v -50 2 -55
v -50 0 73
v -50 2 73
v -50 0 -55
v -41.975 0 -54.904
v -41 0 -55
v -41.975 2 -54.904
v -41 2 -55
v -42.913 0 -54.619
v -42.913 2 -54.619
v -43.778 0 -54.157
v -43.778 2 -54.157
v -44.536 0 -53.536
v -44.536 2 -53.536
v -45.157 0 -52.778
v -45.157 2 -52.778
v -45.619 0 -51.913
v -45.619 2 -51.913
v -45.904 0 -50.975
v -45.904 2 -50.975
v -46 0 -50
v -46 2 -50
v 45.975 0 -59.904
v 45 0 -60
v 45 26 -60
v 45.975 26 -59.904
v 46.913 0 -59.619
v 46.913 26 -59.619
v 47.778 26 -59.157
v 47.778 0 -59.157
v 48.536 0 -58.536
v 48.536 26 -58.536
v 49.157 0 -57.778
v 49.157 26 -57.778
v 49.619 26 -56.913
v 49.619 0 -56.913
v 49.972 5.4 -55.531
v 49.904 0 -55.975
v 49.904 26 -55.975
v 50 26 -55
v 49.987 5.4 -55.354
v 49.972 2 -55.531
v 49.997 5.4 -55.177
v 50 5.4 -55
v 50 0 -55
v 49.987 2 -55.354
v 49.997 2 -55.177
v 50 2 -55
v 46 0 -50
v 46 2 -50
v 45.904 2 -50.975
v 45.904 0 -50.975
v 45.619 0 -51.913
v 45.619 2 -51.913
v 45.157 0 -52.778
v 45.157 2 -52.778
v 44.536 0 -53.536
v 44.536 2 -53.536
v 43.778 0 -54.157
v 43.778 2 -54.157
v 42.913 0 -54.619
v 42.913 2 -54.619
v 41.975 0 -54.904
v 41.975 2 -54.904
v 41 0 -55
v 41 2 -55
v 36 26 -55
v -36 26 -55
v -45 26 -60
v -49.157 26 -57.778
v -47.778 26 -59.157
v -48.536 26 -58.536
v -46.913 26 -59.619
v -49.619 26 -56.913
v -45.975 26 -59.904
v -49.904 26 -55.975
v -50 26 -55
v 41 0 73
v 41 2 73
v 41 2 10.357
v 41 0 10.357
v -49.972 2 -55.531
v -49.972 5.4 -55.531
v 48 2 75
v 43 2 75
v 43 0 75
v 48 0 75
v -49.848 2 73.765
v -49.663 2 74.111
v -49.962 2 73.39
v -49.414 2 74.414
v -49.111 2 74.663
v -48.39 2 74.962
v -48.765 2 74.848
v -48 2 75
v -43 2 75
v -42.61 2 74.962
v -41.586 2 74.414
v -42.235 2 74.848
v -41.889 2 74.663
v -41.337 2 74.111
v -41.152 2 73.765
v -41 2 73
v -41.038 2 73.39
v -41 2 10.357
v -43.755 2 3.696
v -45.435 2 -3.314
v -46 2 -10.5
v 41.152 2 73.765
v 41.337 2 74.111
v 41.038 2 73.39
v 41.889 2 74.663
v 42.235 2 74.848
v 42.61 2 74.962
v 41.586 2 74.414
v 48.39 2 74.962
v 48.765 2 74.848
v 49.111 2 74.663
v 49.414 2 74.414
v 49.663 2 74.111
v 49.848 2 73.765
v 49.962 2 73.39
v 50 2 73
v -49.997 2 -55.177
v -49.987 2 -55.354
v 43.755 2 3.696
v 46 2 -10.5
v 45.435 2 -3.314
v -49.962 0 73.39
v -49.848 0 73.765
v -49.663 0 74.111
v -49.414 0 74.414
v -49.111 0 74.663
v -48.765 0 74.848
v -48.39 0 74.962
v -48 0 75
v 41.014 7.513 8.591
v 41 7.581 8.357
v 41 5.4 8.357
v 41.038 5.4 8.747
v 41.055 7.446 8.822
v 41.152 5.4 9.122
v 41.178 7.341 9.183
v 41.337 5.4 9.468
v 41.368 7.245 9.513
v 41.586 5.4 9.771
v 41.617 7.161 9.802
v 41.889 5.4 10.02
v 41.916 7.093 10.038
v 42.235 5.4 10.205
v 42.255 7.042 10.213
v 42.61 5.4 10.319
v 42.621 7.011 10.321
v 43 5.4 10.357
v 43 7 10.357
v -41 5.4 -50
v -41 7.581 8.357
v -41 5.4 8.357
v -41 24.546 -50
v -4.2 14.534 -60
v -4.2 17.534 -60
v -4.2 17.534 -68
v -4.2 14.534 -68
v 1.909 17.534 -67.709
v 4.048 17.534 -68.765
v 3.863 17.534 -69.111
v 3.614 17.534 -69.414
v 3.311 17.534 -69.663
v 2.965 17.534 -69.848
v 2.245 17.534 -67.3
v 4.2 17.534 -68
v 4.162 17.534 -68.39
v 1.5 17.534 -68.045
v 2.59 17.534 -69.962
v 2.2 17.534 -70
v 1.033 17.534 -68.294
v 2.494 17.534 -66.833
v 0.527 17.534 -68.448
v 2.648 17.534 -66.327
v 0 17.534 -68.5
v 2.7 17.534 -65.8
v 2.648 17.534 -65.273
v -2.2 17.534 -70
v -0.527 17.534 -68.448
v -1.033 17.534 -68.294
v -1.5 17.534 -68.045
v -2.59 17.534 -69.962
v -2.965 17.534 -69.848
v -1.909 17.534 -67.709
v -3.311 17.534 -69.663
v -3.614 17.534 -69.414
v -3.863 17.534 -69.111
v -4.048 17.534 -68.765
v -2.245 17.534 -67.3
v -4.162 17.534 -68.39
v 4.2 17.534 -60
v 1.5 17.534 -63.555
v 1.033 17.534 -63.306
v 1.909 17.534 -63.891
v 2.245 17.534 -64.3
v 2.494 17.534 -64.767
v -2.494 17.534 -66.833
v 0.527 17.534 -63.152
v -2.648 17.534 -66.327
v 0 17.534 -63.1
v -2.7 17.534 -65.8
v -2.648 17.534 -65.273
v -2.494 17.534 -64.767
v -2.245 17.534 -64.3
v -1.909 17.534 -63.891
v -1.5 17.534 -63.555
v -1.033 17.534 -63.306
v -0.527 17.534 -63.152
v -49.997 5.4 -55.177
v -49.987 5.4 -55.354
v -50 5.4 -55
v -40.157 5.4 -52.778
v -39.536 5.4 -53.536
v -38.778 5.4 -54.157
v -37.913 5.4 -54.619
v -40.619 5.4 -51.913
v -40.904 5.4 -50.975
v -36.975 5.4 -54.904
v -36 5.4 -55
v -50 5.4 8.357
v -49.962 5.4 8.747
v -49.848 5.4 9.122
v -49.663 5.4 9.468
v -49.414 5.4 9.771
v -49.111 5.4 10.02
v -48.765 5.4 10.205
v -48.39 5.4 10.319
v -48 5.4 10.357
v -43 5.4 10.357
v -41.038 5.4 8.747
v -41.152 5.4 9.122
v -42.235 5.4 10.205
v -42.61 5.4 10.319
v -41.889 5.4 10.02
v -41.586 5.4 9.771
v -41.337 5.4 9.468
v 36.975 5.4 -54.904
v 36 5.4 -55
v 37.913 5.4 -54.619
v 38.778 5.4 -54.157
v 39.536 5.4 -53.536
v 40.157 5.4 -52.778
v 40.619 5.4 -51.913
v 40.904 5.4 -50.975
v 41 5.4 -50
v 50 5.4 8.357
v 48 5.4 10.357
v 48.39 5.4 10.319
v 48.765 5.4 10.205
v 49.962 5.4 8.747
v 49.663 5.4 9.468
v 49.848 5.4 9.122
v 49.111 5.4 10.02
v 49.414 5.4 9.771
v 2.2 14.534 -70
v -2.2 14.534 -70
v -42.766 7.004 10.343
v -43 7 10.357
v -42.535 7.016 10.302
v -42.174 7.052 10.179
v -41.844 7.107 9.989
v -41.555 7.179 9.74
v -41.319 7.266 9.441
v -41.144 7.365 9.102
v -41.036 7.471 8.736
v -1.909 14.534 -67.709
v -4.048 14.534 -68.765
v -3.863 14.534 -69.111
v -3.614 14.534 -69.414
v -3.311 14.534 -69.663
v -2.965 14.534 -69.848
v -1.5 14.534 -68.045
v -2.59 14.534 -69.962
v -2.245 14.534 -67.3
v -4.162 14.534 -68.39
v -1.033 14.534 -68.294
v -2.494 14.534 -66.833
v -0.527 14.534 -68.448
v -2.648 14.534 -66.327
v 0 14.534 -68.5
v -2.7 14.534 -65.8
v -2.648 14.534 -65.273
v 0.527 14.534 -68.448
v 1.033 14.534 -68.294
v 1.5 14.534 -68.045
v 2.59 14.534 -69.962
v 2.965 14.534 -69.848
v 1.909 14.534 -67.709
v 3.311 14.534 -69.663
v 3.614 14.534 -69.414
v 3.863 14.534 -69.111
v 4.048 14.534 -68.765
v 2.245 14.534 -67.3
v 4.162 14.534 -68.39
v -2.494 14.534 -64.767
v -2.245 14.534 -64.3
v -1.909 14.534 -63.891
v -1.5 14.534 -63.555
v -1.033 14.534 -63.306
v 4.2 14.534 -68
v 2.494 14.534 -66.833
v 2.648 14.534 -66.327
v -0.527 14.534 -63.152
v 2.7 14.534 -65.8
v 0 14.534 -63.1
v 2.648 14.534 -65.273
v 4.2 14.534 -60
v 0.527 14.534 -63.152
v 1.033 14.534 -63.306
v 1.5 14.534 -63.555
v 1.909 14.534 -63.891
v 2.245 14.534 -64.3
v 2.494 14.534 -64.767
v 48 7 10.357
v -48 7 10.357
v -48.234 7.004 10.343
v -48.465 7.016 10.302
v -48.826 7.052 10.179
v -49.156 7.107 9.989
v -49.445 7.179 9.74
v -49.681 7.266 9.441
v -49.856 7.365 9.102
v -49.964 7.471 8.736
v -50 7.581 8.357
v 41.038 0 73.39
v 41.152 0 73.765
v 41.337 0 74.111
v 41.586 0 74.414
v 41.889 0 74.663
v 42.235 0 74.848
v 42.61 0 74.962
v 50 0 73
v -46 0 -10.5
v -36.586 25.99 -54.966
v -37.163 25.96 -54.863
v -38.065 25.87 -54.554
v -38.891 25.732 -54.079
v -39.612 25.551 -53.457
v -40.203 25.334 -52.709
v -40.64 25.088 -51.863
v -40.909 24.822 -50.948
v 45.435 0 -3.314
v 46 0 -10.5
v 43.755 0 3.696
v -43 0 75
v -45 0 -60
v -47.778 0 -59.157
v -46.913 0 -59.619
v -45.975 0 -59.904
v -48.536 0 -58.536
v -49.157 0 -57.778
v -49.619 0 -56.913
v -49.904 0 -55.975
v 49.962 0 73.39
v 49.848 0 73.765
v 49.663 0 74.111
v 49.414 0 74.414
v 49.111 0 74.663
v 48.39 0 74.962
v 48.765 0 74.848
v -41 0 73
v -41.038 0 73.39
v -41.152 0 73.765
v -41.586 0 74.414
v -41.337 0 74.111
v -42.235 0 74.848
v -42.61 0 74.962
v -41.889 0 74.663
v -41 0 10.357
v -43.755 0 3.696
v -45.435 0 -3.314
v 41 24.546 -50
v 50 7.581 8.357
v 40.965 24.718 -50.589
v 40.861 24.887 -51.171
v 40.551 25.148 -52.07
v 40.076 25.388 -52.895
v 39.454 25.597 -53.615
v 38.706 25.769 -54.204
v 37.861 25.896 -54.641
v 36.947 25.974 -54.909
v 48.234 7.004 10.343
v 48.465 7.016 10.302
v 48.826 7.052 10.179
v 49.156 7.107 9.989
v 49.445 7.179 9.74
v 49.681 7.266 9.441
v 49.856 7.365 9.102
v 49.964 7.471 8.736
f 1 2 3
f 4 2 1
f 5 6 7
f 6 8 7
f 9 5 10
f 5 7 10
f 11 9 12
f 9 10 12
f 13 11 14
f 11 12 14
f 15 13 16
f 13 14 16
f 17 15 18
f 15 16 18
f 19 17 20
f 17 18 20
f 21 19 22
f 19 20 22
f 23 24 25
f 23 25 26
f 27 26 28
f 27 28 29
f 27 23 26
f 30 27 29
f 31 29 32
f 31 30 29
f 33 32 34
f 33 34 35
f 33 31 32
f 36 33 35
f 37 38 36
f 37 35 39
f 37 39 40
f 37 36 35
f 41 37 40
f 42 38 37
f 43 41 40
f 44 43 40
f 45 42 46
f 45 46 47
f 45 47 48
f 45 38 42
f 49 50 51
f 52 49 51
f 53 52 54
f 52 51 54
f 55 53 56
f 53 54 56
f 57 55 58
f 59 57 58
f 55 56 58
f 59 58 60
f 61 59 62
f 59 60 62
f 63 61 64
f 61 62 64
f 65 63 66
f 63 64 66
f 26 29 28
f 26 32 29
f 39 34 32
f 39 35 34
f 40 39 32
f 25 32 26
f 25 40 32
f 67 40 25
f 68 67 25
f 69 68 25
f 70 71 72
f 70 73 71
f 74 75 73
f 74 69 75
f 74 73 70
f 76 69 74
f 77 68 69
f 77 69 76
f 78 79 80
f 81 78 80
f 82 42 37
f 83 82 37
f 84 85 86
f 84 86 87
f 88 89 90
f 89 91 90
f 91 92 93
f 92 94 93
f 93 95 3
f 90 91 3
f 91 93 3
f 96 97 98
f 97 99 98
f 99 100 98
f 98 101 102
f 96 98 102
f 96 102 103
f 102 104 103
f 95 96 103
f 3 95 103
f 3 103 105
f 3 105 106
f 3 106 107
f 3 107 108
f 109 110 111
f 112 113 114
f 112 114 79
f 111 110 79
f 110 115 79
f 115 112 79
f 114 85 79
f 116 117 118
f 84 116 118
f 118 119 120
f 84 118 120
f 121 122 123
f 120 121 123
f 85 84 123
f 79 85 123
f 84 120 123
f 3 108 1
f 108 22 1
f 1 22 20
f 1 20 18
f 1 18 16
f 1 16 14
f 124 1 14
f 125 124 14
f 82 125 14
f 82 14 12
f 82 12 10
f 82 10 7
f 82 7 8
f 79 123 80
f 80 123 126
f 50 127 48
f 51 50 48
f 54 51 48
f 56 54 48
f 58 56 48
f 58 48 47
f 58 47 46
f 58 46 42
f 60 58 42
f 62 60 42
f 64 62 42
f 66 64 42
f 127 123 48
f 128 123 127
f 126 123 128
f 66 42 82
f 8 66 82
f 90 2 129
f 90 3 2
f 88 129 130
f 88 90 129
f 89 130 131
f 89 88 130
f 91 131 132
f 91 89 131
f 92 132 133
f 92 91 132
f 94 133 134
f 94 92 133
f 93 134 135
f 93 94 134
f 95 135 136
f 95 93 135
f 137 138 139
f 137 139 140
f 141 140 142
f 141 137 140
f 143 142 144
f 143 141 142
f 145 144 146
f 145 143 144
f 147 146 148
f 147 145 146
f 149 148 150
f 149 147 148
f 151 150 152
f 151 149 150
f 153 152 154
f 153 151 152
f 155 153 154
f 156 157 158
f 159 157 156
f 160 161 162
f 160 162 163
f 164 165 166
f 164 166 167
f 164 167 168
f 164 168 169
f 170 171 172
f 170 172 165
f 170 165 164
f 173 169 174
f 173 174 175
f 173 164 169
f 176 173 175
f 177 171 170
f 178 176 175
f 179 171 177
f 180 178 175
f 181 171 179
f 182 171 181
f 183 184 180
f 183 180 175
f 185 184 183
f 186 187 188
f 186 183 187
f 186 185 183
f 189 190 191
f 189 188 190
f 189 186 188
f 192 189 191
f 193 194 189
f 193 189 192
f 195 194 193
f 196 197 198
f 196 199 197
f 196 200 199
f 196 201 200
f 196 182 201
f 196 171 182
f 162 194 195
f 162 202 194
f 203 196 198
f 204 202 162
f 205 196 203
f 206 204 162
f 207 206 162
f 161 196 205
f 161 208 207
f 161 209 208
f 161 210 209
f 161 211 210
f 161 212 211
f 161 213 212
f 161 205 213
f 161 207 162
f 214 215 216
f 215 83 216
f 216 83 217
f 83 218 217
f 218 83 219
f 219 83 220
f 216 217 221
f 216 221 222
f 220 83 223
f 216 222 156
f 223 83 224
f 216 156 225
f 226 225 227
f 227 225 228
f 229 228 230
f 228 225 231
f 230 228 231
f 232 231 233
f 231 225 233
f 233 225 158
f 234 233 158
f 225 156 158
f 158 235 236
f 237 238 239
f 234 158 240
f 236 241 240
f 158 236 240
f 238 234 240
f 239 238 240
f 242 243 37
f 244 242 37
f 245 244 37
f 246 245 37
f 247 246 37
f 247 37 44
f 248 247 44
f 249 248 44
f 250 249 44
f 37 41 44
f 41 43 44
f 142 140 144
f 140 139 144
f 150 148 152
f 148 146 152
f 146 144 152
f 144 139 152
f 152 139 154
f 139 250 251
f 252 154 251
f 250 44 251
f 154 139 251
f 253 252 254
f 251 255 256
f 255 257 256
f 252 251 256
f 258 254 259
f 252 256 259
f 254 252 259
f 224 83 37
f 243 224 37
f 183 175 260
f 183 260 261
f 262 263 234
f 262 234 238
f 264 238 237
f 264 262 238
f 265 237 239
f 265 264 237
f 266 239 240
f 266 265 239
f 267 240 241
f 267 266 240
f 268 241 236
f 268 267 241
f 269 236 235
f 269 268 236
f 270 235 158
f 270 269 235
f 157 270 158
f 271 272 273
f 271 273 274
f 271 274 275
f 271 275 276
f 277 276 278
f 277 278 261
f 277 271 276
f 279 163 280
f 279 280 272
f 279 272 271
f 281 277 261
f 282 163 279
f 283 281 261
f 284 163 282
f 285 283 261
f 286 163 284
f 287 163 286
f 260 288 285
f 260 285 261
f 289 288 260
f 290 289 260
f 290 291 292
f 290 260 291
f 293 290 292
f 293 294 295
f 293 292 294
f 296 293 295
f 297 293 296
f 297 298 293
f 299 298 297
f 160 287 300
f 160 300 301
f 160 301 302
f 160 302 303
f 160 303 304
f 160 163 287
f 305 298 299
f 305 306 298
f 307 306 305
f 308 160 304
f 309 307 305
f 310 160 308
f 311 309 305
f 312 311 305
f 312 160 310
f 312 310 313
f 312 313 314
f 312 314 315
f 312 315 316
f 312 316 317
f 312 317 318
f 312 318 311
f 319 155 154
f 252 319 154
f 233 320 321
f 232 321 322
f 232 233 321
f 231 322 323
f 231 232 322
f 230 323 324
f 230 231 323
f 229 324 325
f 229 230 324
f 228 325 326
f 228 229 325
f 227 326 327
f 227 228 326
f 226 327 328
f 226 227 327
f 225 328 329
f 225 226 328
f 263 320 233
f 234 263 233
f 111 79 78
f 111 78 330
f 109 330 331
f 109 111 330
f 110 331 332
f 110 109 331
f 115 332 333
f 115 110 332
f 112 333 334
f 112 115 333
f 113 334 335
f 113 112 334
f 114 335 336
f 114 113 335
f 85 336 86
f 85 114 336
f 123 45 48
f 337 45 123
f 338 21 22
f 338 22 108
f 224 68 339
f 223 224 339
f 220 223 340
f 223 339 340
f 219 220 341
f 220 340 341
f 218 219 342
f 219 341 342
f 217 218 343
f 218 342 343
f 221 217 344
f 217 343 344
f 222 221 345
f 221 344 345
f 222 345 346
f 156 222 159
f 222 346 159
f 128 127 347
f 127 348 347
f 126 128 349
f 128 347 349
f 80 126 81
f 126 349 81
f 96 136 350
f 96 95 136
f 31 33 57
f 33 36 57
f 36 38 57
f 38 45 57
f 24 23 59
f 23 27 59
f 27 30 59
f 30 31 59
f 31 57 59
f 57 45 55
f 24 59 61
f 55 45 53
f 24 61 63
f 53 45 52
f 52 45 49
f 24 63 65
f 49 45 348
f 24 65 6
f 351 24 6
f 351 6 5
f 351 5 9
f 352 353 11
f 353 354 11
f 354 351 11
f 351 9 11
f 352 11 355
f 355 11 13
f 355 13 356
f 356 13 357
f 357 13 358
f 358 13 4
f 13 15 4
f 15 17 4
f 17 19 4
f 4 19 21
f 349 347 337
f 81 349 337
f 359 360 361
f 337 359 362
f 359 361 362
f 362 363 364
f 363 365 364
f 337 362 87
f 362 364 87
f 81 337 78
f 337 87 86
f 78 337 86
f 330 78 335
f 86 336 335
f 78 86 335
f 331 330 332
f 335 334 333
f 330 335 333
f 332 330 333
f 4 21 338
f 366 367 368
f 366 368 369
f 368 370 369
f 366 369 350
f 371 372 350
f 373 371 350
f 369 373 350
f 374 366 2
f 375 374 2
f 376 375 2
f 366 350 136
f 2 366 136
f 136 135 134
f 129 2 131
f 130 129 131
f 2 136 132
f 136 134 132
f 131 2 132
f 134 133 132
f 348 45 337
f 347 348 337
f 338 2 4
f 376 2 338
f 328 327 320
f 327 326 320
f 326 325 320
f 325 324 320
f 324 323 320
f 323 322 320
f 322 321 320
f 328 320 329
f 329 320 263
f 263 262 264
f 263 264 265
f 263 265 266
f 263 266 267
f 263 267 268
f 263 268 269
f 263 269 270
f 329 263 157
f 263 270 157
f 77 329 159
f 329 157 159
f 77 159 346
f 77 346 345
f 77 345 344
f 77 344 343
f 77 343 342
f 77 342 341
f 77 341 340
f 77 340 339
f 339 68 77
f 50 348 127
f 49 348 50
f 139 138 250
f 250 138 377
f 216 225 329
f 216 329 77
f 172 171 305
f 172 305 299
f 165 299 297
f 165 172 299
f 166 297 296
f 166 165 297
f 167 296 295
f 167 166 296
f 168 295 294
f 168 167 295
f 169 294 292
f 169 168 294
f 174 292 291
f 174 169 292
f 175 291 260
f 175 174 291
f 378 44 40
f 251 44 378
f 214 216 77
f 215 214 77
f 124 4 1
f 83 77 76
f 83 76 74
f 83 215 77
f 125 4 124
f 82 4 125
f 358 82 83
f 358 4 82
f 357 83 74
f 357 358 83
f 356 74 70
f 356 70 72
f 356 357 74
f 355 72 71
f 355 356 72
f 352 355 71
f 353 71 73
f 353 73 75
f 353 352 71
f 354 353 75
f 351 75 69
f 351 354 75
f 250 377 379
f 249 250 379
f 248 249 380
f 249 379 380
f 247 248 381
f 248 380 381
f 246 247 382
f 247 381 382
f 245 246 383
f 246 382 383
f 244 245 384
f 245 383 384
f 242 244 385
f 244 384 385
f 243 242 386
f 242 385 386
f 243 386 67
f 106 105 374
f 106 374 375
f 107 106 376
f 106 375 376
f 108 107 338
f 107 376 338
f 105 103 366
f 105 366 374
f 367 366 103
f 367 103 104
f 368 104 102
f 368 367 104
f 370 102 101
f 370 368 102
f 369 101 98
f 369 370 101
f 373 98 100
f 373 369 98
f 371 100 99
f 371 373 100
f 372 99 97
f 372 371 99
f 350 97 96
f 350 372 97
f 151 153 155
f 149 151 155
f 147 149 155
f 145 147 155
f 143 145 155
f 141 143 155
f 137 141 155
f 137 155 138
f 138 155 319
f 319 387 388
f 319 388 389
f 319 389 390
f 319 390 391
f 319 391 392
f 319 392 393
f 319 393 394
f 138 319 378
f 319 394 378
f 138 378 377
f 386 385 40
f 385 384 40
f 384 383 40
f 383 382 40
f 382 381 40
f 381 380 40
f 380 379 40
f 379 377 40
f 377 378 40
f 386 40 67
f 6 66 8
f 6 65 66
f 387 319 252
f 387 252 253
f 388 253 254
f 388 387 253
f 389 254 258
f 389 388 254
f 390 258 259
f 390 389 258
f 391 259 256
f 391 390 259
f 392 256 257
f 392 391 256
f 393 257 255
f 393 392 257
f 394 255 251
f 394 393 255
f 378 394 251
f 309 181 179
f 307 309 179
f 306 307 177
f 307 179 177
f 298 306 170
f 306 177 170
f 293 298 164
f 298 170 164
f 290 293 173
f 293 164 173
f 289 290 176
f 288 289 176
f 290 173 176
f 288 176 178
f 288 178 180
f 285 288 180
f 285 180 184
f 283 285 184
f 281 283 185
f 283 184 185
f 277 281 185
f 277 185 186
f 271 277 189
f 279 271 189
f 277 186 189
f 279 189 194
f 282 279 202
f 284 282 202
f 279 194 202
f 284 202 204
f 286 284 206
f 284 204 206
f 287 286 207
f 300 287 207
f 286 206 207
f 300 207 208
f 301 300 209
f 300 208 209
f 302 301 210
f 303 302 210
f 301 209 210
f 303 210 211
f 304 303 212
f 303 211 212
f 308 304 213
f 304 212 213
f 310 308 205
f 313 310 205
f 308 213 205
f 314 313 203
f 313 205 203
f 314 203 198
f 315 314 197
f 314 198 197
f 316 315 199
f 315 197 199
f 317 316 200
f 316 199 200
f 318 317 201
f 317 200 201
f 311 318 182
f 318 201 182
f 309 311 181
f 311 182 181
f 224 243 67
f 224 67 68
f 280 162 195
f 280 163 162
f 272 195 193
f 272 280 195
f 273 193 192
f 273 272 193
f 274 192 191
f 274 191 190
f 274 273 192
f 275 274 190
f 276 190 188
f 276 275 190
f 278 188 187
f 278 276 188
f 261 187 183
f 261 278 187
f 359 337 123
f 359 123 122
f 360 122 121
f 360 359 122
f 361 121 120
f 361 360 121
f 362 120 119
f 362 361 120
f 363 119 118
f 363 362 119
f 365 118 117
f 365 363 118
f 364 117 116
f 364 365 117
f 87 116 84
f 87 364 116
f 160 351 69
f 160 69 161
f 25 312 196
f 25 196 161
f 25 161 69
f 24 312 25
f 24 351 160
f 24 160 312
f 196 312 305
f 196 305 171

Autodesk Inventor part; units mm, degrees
ref_plane "YZ Plane" through (0, 0, 0) normal (1, 0, 0) x (0, 1, 0)
ref_plane "XZ Plane" through (0, 0, 0) normal (0, 1, 0) x (-1, 0, 0)
ref_plane "XY Plane" through (0, 0, 0) normal (0, 0, 1) x (1, 0, 0)
sketch "Sketch1" plane through (0, 0, 0) normal (0, 1, 0) x (-1, 0, 0)
  line L0 (50, -60) -> (-50, -60)
  line L1 (-50, -60) -> (-50, 60)
  line L2 (-50, 60) -> (50, 60)
  line L3 (50, 60) -> (50, -60)
  line L4 (50, -60) -> (-50, 60) construction
  line L5 (-50, -60) -> (50, 60) construction
  point P0 (0, 0)
  dimension "d0" = 100
  dimension "d1" = 120
extrude "Extrusion1" add sketch "Sketch1" along normal blind 26
sketch "Sketch2" plane through (0, 26, 0) normal (0, 1, 0) x (1, 0, 0)
  line L0 (-41, -60) -> (41, -60)
  line L1 (-50, -60) -> (50, -60) projected
  line L2 (41, -60) -> (41, -4.7988)
  line L3 (50, 60) -> (-50, 60) projected
  line L4 (-41, -60) -> (-41, 55)
  line L5 (-41, 55) -> (41, 55)
  line L6 (41, 55) -> (41, -4.7988)
  point P0 (0, 0)
  dimension "d23" = 115
extrude "Extrusion2" cut sketch "Sketch2" against normal through all
sketch "Sketch11" plane through (0, 0, 0) normal (0, -1, 0) x (1, 0, 0)
  arc A0 (46, -10.5) -> (-46, -10.5) centre (0, -10.5) ccw
  line L0 (41, -55) -> (-41, -55) projected
  line L1 (-46, -10.5) -> (46, -10.5)
  line L2 (46, -10.5) -> (46, -55)
  line L3 (46, -55) -> (-46, -55)
  line L4 (-46, -55) -> (-46, -10.5)
  point P0 (0, 0)
  dimension "d24" = 92
  dimension "d25" = 44.5
extrude "Extrusion7" cut sketch "Sketch11" against normal blind 5.4
sketch "Sketch13" plane through (-41, 26, 60) normal (1, 0, 0) x (0, 0, -1)
  line L0 (0, -26) -> (0, 0) projected
  line L1 (0, -24) -> (115.5309, -24)
  line L2 (115.5309, -24) -> (115.5309, -20.6)
  line L3 (115.5309, -20.6) -> (0, -20.6)
  line L4 (0, -20.6) -> (0, -24)
  line L5 (49.6433, -26) -> (0, -26) projected
  point P0 (60, -26)
  point P1 (0, -20.6)
  dimension "d48" = 115.5309
  dimension "d49" = 3.4
  dimension "d50" = 2
extrude "Extrusion8" cut sketch "Sketch13" against normal through all both and the other way through all
sketch "Sketch14" plane through (-41, 26, 60) normal (1, 0, 0) x (0, 0, -1)
  line L0 (0, -20.6) -> (0, 0) projected
  line L1 (0, 0) -> (49.643, 0)
  line L2 (49.643, 0) -> (49.643, -20.6)
  line L3 (49.643, -20.6) -> (0, -20.6)
  line L4 (0, -20.6) -> (0, 0)
  point P0 (60, -26)
  dimension "d51" = 20.6
  dimension "d52" = 49.643
extrude "Extrusion9" cut sketch "Sketch14" along normal through all both and the other way through all
sketch "Sketch15" plane through (0, 0, 0) normal (1, 0, 0) x (0, 1, 0)
  line L0 (26, -55) -> (5.4, -55) projected
  line L1 (7, 10.357) -> (26, -55)
  line L2 (26, -55) -> (26, 10.357)
  line L3 (26, 10.357) -> (7, 10.357)
  point P0 (0, 0)
  dimension "d53" = 65.357
  dimension "d54" = 19
extrude "Extrusion10" cut sketch "Sketch15" against normal through all both and the other way through all
fillet "Fillet1" radius 5 4 edges at (-41, 15.7, -55) (50, 13, -60) (-50, 13, -60) (41, 15.7, -55)
fillet "Fillet2" radius 5 2 edges at (-46, 1, -55) (46, 1, -55)
sketch "Sketch16" plane through (45, 0, -60) normal (0, 0, -1) x (-1, 0, 0)
  line L0 (45, 0) -> (45, 26)
  line L1 (81, 26) -> (9, 26) projected
  line L2 (40.8, 17.5345) -> (49.2, 17.5345)
  line L3 (49.2, 17.5345) -> (49.2, 14.5345)
  line L4 (49.2, 14.5345) -> (40.8, 14.5345)
  line L5 (40.8, 14.5345) -> (40.8, 17.5345)
  line L6 (40.8, 17.5345) -> (49.2, 14.5345) construction
  line L7 (49.2, 17.5345) -> (40.8, 14.5345) construction
  point P0 (45, 16.0345)
  dimension "d38" = 8.4
  dimension "d39" = 3
extrude "Extrusion11" add sketch "Sketch16" along normal blind 10
sketch "Sketch17" plane through (-4.2, 17.5345, -60) normal (0, 1, 0) x (1, 0, 0)
  circle A0 centre (4.2, 5.8) radius 2.7
  line L0 (0, 0) -> (0, 10) projected
  line L1 (0, 10) -> (8.4, 10) projected
  point P0 (4.2, -60)
  dimension "d42" = 5.4
  dimension "d43" = 4.2
  dimension "d44" = 4.2
extrude "Extrusion12" cut sketch "Sketch17" against normal through all
fillet "Fillet5" radius 2 2 edges at (-4.2, 16.0345, -70) (4.2, 16.0345, -70)
sketch "Sketch18" plane through (45, 0, -60) normal (0, 0, -1) x (-1, 0, 0)
  point P0 (45, 0)
sketch "Sketch19" plane through (-50, 5.4, -55) normal (-1, 0, 0) x (0, 0, 1)
  point P0 (55, -5.4)
sketch "Sketch20" plane through (-50, 0, 60) normal (0, 0, 1) x (1, 0, 0)
  line L0 (9, 2) -> (0, 2) projected
  line L1 (0, 0) -> (9, 0) projected
  line L2 (0, 2) -> (9, 2)
  line L3 (9, 2) -> (9, 0)
  line L4 (9, 0) -> (0, 0)
  line L5 (0, 0) -> (0, 2)
  line L6 (100, 0) -> (95, 0) projected
  line L7 (100, 2) -> (91, 2) projected
  line L8 (100, 0) -> (91, 0)
  line L9 (91, 0) -> (91, 2)
  line L10 (91, 2) -> (100, 2)
  line L11 (100, 2) -> (100, 0)
  point P0 (50, 0)
extrude "Extrusion13" add sketch "Sketch20" along normal blind 15
fillet "Fillet7" radius 2 4 edges at (-41, 6.2, 10.357) (-50, 6.2, 10.357) (50, 6.2, 10.357) (41, 6.2, 10.357)
fillet "Fillet8" radius 2 4 edges at (50, 1, 75) (41, 1, 75) (-41, 1, 75) (-50, 1, 75)
properties part number "Khay gạt cốc"
